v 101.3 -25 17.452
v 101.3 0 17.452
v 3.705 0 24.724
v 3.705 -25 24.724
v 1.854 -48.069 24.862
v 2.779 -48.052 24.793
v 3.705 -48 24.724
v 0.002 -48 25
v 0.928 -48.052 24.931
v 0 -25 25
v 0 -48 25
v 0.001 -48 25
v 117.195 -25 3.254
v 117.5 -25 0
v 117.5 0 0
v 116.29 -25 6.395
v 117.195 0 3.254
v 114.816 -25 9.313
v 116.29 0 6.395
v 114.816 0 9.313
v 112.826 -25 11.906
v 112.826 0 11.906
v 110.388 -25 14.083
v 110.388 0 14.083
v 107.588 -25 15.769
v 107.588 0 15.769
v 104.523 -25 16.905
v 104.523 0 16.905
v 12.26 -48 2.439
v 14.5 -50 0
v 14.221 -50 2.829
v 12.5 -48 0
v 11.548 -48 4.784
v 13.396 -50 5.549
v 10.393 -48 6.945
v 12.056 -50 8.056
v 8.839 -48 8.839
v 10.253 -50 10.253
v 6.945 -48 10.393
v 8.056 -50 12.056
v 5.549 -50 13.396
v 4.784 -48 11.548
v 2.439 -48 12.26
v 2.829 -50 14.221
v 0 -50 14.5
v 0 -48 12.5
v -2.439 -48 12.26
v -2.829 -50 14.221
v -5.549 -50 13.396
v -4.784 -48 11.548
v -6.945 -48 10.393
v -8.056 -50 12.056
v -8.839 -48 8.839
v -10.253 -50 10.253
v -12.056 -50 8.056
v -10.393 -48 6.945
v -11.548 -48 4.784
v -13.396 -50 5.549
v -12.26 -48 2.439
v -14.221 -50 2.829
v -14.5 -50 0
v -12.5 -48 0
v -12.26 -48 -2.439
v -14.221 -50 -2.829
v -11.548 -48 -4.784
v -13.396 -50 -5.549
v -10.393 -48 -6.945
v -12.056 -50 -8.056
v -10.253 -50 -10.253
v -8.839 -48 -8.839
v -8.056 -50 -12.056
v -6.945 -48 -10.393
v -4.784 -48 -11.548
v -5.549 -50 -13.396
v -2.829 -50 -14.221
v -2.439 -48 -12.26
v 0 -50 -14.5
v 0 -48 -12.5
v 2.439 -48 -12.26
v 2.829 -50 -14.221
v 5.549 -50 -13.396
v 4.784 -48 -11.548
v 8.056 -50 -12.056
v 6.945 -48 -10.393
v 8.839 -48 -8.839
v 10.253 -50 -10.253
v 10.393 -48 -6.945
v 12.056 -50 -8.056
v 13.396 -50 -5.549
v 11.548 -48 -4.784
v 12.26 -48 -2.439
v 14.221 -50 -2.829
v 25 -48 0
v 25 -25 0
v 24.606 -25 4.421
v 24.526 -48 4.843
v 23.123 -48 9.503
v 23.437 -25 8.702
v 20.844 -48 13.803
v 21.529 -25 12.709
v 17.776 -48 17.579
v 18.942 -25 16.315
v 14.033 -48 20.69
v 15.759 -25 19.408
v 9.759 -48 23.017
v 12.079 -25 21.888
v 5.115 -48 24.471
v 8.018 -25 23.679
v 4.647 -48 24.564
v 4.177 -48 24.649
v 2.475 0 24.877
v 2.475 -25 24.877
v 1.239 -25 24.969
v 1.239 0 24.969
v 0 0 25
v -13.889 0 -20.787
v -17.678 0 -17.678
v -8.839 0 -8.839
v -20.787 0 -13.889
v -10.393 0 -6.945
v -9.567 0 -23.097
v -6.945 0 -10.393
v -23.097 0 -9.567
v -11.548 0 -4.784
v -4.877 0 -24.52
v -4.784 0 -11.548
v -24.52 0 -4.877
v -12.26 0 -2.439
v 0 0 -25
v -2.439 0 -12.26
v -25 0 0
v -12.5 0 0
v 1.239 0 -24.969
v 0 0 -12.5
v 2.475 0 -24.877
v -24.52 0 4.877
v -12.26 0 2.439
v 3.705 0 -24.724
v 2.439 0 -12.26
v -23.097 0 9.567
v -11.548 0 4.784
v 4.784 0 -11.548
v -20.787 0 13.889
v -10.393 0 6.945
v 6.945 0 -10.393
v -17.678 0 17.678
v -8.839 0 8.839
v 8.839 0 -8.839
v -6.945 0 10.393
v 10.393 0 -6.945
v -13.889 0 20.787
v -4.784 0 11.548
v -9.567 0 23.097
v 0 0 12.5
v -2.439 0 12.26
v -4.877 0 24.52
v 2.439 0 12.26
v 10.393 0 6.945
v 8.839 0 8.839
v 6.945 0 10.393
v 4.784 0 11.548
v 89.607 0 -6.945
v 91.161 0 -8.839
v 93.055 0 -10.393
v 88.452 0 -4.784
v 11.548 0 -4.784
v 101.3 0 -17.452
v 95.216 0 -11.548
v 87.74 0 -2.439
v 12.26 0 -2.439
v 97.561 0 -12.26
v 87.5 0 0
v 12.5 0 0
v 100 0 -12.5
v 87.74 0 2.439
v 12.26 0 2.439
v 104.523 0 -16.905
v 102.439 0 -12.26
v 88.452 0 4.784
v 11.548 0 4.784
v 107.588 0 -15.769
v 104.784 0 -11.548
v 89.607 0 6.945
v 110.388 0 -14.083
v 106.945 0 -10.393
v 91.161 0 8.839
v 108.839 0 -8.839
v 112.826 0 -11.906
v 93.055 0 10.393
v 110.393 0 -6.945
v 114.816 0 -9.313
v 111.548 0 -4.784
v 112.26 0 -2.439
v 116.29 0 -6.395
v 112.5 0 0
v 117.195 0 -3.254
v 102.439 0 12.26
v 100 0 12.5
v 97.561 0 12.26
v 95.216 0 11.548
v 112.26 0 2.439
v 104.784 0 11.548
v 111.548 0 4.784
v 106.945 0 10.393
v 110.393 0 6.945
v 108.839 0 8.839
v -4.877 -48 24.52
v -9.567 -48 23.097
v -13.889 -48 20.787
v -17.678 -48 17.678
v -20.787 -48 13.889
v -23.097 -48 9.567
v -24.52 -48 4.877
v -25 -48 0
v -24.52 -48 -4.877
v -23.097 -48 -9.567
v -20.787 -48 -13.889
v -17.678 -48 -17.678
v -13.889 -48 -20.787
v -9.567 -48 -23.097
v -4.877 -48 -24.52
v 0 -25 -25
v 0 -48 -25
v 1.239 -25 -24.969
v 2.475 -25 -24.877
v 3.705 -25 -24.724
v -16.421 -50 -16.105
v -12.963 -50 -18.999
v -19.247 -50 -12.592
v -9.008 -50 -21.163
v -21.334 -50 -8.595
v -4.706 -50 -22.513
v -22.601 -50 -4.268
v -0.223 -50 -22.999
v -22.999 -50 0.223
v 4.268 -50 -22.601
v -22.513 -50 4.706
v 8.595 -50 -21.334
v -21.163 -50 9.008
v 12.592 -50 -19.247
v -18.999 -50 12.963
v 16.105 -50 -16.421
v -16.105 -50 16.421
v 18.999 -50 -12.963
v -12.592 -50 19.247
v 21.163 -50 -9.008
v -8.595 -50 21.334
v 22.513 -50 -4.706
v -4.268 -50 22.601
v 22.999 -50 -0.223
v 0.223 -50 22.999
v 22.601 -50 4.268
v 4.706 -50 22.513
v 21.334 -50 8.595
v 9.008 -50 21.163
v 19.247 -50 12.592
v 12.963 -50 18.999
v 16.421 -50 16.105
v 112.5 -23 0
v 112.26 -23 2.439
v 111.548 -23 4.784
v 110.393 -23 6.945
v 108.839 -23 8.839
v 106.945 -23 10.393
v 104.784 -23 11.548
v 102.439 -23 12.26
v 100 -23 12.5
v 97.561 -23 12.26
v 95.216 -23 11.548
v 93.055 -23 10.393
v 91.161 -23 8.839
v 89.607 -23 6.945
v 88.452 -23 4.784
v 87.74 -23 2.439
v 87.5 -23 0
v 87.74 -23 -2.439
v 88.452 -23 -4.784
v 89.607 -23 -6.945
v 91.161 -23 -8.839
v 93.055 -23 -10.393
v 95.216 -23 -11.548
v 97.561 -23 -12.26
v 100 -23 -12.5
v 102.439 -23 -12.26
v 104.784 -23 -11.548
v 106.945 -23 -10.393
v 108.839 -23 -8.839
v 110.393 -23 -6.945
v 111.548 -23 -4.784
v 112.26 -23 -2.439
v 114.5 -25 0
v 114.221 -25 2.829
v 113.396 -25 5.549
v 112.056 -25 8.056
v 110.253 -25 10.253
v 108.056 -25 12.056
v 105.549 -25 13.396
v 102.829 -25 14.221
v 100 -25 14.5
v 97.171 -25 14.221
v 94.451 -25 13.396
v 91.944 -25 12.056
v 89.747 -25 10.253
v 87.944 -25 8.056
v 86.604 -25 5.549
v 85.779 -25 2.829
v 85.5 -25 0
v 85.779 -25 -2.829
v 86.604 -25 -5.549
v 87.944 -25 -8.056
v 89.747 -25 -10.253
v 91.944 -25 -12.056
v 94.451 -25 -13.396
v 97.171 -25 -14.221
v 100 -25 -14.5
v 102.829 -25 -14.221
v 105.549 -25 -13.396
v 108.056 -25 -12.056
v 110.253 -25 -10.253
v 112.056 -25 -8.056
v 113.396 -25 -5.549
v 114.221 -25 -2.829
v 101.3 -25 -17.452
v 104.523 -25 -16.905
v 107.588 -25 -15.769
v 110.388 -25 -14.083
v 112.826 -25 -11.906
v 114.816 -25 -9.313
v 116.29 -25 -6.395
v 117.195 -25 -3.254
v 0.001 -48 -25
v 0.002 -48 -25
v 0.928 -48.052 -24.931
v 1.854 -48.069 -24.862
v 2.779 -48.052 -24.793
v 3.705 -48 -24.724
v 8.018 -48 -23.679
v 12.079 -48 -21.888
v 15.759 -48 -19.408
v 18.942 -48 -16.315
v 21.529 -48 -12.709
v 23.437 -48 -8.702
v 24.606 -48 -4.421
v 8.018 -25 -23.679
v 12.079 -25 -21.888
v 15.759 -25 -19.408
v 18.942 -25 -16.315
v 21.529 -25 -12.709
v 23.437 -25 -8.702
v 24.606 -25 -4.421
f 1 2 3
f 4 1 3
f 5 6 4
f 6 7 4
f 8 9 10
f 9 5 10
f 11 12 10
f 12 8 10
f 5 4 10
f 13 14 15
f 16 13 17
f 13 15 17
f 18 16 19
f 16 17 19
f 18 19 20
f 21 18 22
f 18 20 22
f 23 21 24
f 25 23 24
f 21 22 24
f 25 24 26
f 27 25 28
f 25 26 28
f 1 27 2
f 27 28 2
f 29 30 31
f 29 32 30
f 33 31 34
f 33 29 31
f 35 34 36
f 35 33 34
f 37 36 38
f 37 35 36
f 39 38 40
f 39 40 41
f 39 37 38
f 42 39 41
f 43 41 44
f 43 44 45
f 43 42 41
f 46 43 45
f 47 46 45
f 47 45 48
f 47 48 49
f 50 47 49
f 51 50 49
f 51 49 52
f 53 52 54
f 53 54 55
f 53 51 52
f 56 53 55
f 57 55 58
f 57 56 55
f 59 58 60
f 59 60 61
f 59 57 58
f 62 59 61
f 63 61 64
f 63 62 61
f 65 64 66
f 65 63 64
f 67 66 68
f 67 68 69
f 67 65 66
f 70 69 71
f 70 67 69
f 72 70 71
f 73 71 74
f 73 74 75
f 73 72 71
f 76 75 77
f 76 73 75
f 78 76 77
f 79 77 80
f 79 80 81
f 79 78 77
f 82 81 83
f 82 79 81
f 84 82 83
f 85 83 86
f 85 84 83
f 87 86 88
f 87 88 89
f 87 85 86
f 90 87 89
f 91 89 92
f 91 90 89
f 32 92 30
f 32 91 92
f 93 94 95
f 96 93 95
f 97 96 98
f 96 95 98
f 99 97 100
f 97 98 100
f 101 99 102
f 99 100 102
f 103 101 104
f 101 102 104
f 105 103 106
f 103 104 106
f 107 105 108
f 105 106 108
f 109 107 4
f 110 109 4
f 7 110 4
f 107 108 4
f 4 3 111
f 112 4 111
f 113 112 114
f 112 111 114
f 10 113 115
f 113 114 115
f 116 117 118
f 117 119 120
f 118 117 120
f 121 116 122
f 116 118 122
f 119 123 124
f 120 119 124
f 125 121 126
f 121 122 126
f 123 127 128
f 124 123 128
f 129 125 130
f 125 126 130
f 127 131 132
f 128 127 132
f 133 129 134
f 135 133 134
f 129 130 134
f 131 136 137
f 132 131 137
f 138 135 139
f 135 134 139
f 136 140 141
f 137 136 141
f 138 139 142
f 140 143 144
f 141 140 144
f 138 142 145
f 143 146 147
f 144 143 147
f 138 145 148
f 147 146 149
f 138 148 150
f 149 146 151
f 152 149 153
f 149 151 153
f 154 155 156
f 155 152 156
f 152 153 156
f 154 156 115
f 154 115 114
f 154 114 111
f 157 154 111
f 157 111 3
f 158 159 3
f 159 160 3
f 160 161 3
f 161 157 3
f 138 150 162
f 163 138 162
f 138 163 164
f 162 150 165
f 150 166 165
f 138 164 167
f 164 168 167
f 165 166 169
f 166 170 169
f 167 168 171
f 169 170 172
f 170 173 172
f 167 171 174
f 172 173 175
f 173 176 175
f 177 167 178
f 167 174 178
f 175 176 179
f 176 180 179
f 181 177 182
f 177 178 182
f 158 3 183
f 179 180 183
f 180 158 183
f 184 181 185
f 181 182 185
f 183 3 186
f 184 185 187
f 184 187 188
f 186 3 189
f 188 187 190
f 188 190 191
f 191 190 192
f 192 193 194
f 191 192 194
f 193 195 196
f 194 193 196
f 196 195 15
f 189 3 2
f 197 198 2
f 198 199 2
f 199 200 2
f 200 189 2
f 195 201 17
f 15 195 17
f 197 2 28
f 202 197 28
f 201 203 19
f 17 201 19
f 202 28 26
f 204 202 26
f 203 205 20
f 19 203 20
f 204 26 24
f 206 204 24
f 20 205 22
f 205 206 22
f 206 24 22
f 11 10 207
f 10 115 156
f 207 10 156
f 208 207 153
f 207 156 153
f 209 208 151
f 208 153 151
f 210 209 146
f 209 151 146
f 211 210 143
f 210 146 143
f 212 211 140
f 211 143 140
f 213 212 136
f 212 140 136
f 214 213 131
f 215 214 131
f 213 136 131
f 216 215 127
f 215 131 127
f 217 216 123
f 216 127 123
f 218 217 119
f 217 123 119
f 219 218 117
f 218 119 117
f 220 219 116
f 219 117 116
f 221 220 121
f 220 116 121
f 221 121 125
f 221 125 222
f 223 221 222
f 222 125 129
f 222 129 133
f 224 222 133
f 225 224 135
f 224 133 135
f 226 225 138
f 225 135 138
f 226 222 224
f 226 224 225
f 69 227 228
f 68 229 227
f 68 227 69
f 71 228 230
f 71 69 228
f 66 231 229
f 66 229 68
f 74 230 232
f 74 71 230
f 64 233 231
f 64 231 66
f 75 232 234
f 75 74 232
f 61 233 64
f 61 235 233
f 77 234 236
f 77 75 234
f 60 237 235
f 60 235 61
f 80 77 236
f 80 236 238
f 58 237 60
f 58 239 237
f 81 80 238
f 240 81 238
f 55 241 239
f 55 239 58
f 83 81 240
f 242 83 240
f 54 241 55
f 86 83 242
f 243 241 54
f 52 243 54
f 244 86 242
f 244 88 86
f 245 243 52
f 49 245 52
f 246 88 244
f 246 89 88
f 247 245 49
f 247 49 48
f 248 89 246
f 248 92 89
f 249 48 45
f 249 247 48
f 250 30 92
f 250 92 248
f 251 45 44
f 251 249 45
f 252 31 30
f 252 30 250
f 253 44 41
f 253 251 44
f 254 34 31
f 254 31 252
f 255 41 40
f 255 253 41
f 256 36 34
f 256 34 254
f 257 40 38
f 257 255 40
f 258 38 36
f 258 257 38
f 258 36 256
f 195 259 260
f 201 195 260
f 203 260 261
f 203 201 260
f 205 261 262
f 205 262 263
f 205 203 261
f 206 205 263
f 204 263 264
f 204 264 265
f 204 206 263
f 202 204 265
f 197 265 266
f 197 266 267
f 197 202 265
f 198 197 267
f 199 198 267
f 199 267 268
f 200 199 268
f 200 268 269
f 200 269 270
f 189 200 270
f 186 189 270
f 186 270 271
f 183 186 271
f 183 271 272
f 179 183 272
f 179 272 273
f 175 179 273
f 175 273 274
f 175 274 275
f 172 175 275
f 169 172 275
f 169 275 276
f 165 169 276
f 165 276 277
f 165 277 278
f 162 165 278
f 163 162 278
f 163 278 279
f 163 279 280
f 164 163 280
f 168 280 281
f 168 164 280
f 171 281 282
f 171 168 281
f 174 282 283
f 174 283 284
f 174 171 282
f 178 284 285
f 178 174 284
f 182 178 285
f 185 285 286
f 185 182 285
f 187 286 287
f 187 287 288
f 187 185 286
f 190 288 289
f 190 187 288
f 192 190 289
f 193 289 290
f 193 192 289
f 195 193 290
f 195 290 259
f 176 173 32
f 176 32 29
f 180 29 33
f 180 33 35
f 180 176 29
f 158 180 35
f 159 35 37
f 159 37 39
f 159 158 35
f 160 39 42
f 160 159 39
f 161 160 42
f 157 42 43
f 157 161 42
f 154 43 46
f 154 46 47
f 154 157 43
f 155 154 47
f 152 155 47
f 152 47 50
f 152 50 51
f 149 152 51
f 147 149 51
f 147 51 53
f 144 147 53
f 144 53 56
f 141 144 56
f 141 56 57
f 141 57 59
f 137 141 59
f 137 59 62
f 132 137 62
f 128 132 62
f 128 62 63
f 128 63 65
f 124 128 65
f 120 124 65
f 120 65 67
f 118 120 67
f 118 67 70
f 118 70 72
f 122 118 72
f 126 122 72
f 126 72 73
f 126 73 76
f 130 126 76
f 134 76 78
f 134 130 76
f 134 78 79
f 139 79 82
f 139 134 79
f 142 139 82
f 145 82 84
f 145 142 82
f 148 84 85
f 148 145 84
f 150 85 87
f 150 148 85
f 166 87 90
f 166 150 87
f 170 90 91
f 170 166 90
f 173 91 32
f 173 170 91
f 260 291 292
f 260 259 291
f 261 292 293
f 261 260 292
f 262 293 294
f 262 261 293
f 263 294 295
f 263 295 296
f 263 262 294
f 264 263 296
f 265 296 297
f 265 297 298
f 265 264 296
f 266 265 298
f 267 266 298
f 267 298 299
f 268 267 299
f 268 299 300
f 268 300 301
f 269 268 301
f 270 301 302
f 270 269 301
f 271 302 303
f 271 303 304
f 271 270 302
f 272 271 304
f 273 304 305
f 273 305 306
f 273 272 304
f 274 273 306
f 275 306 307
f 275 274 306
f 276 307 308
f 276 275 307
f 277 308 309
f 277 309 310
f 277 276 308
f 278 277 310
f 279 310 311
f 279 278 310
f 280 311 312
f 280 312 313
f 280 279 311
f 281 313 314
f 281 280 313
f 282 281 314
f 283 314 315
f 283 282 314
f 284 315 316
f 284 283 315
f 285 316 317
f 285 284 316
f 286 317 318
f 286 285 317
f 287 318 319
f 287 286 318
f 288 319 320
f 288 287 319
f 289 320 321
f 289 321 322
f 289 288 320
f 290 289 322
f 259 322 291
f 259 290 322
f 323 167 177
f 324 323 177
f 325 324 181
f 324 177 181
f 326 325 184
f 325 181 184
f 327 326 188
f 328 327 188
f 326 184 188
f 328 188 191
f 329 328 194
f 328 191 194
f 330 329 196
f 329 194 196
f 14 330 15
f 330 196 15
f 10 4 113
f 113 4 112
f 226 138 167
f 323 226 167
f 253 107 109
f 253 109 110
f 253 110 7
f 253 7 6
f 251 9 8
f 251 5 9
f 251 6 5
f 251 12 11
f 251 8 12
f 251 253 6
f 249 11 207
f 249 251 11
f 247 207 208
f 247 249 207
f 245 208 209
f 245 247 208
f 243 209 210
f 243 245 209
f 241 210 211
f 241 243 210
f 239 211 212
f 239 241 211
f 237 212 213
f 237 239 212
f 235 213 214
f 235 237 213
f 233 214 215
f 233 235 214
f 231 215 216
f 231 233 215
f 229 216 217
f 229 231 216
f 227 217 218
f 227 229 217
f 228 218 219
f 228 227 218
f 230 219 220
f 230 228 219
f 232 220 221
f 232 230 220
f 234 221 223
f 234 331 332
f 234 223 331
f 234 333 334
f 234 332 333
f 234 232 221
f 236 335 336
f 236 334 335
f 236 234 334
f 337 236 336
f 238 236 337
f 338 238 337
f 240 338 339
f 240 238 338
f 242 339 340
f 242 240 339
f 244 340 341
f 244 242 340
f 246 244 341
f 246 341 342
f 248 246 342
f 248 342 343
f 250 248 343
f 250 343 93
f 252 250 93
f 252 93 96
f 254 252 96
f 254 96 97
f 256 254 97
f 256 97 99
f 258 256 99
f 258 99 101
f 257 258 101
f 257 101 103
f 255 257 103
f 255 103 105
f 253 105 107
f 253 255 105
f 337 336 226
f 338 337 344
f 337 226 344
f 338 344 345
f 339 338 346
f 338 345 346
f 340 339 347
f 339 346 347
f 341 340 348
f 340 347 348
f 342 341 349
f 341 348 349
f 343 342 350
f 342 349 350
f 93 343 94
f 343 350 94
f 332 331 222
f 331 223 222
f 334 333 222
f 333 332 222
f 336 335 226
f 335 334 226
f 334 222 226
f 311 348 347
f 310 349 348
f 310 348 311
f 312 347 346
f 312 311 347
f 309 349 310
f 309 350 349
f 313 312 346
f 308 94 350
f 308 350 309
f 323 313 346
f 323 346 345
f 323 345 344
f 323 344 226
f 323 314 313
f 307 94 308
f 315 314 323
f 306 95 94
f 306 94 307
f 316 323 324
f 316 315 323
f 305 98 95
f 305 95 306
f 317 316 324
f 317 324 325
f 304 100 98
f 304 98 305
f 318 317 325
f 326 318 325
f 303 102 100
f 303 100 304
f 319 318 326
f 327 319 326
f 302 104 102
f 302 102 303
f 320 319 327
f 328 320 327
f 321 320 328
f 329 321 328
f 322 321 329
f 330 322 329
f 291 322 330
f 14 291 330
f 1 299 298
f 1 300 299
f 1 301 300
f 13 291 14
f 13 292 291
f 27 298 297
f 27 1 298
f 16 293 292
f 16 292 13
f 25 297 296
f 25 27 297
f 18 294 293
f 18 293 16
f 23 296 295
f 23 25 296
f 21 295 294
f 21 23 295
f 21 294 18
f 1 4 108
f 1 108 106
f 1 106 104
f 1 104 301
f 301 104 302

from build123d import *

# Parameters (mm, degrees)
F0_R        = 12.5
F1_DEPTH    = 25
F2_DEPTH    = 50
F3_T4_ANGLE = 203.6133668192
F3_T6_ANGLE = 179.9906971182


# Not quite as in the source:
# - a fillet or chamfer that OpenCascade refuses, or shapes differently, is made with other operations: its cross-section is extruded or revolved along the edge and cut away or added


with BuildPart() as f1:
    # F0 (on Front) → F1 (new body)
    with BuildSketch(Plane.XZ):
        with BuildLine():
            Line((3.7051688109, 24.7239099675), (0, 25))
            ThreePointArc((0, 25), (-25, 0), (0, -25))
            Line((0, -25), (3.7051688109, -24.7239099675))
            ThreePointArc((3.7051688109, -24.7239099675), (18.9424024383, -16.3151889313), (25, 0))
            ThreePointArc((25, 0), (18.9424024383, 16.3151889313), (3.7051688109, 24.7239099675))
        make_face()
        Circle(F0_R, mode=Mode.SUBTRACT)
        with BuildLine():
            ThreePointArc((3.7051688109, 24.7239099675), (1.8577204864, 24.9308819458), (0, 25))
            Line((0, 25), (3.7051688109, 24.7239099675))
        make_face()
        with BuildLine():
            Line((3.7051688109, -24.7239099675), (0, -25))
            ThreePointArc((0, -25), (1.8577204864, -24.9308819458), (3.7051688109, -24.7239099675))
        make_face()
        with BuildLine():
            Line((101.3004043405, 17.451617362), (3.7051688109, 24.7239099675))
            ThreePointArc((3.7051688109, 24.7239099675), (18.9424024383, 16.3151889313), (25, 0))
            ThreePointArc((25, 0), (18.9424024383, -16.3151889313), (3.7051688109, -24.7239099675))
            Line((3.7051688109, -24.7239099675), (101.3004043405, -17.451617362))
            ThreePointArc((101.3004043405, -17.451617362), (82.5, 0), (101.3004043405, 17.451617362))
        make_face()
        with BuildLine():
            ThreePointArc((117.5, 0), (112.8258932624, 11.9057323177), (101.3004043405, 17.451617362))
            ThreePointArc((101.3004043405, 17.451617362), (82.5, 0), (101.3004043405, -17.451617362))
            ThreePointArc((101.3004043405, -17.451617362), (112.8258932624, -11.9057323177), (117.5, 0))
        make_face()
        with Locations((100, 0)):
            Circle(F0_R, mode=Mode.SUBTRACT)
    extrude(amount=F1_DEPTH)

    # F0 (on Front) → F2 (join)
    with BuildSketch(Plane.XZ):
        with BuildLine():
            Line((3.7051688109, 24.7239099675), (0, 25))
            ThreePointArc((0, 25), (-25, 0), (0, -25))
            Line((0, -25), (3.7051688109, -24.7239099675))
            ThreePointArc((3.7051688109, -24.7239099675), (18.9424024383, -16.3151889313), (25, 0))
            ThreePointArc((25, 0), (18.9424024383, 16.3151889313), (3.7051688109, 24.7239099675))
        make_face()
        Circle(F0_R, mode=Mode.SUBTRACT)
    extrude(amount=F2_DEPTH)

    # F3: chamfer of 2 on 4 edges, made by hand

    # F3_s1 → F3_t2 (revolve, cut)
    with BuildSketch(Plane.XY):
        Polygon((14.5, -50), (12.5, -48), (12.5, -50), align=None)
    revolve(axis=Axis((0, -50, 0), (0, -1, 0)), mode=Mode.SUBTRACT)

    # F3_s3 → F3_t4 (revolve, cut)
    with BuildSketch(Plane(origin=(0, 0, 0), x_dir=(0, 1, 0), z_dir=(0.9788435281, 0, -0.2046102329))):
        Polygon((-48, 25), (-50, 23), (-50, 25), align=None)
    revolve(axis=Axis((0, -50, 0), (0, -1, 0)), revolution_arc=F3_T4_ANGLE, mode=Mode.SUBTRACT)

    # F3_s5 → F3_t6 (revolve, cut)
    with BuildSketch(Plane(origin=(0, 0, 0), x_dir=(0, 1, 0), z_dir=(-0.9999999967, 0, 8.1183e-05))):
        Polygon((-48, -25), (-50, -23), (-50, -25), align=None)
    revolve(axis=Axis((0, -50, 0), (0, 1, 0)), revolution_arc=F3_T6_ANGLE, mode=Mode.SUBTRACT)

    # F3_s7 → F3_t8 (revolve, cut)
    with BuildSketch(Plane.XY):
        Polygon((114.5, -25), (112.5, -23), (112.5, -25), align=None)
    revolve(axis=Axis((100, -25, 0), (0, -1, 0)), mode=Mode.SUBTRACT)


solid = f1.part
